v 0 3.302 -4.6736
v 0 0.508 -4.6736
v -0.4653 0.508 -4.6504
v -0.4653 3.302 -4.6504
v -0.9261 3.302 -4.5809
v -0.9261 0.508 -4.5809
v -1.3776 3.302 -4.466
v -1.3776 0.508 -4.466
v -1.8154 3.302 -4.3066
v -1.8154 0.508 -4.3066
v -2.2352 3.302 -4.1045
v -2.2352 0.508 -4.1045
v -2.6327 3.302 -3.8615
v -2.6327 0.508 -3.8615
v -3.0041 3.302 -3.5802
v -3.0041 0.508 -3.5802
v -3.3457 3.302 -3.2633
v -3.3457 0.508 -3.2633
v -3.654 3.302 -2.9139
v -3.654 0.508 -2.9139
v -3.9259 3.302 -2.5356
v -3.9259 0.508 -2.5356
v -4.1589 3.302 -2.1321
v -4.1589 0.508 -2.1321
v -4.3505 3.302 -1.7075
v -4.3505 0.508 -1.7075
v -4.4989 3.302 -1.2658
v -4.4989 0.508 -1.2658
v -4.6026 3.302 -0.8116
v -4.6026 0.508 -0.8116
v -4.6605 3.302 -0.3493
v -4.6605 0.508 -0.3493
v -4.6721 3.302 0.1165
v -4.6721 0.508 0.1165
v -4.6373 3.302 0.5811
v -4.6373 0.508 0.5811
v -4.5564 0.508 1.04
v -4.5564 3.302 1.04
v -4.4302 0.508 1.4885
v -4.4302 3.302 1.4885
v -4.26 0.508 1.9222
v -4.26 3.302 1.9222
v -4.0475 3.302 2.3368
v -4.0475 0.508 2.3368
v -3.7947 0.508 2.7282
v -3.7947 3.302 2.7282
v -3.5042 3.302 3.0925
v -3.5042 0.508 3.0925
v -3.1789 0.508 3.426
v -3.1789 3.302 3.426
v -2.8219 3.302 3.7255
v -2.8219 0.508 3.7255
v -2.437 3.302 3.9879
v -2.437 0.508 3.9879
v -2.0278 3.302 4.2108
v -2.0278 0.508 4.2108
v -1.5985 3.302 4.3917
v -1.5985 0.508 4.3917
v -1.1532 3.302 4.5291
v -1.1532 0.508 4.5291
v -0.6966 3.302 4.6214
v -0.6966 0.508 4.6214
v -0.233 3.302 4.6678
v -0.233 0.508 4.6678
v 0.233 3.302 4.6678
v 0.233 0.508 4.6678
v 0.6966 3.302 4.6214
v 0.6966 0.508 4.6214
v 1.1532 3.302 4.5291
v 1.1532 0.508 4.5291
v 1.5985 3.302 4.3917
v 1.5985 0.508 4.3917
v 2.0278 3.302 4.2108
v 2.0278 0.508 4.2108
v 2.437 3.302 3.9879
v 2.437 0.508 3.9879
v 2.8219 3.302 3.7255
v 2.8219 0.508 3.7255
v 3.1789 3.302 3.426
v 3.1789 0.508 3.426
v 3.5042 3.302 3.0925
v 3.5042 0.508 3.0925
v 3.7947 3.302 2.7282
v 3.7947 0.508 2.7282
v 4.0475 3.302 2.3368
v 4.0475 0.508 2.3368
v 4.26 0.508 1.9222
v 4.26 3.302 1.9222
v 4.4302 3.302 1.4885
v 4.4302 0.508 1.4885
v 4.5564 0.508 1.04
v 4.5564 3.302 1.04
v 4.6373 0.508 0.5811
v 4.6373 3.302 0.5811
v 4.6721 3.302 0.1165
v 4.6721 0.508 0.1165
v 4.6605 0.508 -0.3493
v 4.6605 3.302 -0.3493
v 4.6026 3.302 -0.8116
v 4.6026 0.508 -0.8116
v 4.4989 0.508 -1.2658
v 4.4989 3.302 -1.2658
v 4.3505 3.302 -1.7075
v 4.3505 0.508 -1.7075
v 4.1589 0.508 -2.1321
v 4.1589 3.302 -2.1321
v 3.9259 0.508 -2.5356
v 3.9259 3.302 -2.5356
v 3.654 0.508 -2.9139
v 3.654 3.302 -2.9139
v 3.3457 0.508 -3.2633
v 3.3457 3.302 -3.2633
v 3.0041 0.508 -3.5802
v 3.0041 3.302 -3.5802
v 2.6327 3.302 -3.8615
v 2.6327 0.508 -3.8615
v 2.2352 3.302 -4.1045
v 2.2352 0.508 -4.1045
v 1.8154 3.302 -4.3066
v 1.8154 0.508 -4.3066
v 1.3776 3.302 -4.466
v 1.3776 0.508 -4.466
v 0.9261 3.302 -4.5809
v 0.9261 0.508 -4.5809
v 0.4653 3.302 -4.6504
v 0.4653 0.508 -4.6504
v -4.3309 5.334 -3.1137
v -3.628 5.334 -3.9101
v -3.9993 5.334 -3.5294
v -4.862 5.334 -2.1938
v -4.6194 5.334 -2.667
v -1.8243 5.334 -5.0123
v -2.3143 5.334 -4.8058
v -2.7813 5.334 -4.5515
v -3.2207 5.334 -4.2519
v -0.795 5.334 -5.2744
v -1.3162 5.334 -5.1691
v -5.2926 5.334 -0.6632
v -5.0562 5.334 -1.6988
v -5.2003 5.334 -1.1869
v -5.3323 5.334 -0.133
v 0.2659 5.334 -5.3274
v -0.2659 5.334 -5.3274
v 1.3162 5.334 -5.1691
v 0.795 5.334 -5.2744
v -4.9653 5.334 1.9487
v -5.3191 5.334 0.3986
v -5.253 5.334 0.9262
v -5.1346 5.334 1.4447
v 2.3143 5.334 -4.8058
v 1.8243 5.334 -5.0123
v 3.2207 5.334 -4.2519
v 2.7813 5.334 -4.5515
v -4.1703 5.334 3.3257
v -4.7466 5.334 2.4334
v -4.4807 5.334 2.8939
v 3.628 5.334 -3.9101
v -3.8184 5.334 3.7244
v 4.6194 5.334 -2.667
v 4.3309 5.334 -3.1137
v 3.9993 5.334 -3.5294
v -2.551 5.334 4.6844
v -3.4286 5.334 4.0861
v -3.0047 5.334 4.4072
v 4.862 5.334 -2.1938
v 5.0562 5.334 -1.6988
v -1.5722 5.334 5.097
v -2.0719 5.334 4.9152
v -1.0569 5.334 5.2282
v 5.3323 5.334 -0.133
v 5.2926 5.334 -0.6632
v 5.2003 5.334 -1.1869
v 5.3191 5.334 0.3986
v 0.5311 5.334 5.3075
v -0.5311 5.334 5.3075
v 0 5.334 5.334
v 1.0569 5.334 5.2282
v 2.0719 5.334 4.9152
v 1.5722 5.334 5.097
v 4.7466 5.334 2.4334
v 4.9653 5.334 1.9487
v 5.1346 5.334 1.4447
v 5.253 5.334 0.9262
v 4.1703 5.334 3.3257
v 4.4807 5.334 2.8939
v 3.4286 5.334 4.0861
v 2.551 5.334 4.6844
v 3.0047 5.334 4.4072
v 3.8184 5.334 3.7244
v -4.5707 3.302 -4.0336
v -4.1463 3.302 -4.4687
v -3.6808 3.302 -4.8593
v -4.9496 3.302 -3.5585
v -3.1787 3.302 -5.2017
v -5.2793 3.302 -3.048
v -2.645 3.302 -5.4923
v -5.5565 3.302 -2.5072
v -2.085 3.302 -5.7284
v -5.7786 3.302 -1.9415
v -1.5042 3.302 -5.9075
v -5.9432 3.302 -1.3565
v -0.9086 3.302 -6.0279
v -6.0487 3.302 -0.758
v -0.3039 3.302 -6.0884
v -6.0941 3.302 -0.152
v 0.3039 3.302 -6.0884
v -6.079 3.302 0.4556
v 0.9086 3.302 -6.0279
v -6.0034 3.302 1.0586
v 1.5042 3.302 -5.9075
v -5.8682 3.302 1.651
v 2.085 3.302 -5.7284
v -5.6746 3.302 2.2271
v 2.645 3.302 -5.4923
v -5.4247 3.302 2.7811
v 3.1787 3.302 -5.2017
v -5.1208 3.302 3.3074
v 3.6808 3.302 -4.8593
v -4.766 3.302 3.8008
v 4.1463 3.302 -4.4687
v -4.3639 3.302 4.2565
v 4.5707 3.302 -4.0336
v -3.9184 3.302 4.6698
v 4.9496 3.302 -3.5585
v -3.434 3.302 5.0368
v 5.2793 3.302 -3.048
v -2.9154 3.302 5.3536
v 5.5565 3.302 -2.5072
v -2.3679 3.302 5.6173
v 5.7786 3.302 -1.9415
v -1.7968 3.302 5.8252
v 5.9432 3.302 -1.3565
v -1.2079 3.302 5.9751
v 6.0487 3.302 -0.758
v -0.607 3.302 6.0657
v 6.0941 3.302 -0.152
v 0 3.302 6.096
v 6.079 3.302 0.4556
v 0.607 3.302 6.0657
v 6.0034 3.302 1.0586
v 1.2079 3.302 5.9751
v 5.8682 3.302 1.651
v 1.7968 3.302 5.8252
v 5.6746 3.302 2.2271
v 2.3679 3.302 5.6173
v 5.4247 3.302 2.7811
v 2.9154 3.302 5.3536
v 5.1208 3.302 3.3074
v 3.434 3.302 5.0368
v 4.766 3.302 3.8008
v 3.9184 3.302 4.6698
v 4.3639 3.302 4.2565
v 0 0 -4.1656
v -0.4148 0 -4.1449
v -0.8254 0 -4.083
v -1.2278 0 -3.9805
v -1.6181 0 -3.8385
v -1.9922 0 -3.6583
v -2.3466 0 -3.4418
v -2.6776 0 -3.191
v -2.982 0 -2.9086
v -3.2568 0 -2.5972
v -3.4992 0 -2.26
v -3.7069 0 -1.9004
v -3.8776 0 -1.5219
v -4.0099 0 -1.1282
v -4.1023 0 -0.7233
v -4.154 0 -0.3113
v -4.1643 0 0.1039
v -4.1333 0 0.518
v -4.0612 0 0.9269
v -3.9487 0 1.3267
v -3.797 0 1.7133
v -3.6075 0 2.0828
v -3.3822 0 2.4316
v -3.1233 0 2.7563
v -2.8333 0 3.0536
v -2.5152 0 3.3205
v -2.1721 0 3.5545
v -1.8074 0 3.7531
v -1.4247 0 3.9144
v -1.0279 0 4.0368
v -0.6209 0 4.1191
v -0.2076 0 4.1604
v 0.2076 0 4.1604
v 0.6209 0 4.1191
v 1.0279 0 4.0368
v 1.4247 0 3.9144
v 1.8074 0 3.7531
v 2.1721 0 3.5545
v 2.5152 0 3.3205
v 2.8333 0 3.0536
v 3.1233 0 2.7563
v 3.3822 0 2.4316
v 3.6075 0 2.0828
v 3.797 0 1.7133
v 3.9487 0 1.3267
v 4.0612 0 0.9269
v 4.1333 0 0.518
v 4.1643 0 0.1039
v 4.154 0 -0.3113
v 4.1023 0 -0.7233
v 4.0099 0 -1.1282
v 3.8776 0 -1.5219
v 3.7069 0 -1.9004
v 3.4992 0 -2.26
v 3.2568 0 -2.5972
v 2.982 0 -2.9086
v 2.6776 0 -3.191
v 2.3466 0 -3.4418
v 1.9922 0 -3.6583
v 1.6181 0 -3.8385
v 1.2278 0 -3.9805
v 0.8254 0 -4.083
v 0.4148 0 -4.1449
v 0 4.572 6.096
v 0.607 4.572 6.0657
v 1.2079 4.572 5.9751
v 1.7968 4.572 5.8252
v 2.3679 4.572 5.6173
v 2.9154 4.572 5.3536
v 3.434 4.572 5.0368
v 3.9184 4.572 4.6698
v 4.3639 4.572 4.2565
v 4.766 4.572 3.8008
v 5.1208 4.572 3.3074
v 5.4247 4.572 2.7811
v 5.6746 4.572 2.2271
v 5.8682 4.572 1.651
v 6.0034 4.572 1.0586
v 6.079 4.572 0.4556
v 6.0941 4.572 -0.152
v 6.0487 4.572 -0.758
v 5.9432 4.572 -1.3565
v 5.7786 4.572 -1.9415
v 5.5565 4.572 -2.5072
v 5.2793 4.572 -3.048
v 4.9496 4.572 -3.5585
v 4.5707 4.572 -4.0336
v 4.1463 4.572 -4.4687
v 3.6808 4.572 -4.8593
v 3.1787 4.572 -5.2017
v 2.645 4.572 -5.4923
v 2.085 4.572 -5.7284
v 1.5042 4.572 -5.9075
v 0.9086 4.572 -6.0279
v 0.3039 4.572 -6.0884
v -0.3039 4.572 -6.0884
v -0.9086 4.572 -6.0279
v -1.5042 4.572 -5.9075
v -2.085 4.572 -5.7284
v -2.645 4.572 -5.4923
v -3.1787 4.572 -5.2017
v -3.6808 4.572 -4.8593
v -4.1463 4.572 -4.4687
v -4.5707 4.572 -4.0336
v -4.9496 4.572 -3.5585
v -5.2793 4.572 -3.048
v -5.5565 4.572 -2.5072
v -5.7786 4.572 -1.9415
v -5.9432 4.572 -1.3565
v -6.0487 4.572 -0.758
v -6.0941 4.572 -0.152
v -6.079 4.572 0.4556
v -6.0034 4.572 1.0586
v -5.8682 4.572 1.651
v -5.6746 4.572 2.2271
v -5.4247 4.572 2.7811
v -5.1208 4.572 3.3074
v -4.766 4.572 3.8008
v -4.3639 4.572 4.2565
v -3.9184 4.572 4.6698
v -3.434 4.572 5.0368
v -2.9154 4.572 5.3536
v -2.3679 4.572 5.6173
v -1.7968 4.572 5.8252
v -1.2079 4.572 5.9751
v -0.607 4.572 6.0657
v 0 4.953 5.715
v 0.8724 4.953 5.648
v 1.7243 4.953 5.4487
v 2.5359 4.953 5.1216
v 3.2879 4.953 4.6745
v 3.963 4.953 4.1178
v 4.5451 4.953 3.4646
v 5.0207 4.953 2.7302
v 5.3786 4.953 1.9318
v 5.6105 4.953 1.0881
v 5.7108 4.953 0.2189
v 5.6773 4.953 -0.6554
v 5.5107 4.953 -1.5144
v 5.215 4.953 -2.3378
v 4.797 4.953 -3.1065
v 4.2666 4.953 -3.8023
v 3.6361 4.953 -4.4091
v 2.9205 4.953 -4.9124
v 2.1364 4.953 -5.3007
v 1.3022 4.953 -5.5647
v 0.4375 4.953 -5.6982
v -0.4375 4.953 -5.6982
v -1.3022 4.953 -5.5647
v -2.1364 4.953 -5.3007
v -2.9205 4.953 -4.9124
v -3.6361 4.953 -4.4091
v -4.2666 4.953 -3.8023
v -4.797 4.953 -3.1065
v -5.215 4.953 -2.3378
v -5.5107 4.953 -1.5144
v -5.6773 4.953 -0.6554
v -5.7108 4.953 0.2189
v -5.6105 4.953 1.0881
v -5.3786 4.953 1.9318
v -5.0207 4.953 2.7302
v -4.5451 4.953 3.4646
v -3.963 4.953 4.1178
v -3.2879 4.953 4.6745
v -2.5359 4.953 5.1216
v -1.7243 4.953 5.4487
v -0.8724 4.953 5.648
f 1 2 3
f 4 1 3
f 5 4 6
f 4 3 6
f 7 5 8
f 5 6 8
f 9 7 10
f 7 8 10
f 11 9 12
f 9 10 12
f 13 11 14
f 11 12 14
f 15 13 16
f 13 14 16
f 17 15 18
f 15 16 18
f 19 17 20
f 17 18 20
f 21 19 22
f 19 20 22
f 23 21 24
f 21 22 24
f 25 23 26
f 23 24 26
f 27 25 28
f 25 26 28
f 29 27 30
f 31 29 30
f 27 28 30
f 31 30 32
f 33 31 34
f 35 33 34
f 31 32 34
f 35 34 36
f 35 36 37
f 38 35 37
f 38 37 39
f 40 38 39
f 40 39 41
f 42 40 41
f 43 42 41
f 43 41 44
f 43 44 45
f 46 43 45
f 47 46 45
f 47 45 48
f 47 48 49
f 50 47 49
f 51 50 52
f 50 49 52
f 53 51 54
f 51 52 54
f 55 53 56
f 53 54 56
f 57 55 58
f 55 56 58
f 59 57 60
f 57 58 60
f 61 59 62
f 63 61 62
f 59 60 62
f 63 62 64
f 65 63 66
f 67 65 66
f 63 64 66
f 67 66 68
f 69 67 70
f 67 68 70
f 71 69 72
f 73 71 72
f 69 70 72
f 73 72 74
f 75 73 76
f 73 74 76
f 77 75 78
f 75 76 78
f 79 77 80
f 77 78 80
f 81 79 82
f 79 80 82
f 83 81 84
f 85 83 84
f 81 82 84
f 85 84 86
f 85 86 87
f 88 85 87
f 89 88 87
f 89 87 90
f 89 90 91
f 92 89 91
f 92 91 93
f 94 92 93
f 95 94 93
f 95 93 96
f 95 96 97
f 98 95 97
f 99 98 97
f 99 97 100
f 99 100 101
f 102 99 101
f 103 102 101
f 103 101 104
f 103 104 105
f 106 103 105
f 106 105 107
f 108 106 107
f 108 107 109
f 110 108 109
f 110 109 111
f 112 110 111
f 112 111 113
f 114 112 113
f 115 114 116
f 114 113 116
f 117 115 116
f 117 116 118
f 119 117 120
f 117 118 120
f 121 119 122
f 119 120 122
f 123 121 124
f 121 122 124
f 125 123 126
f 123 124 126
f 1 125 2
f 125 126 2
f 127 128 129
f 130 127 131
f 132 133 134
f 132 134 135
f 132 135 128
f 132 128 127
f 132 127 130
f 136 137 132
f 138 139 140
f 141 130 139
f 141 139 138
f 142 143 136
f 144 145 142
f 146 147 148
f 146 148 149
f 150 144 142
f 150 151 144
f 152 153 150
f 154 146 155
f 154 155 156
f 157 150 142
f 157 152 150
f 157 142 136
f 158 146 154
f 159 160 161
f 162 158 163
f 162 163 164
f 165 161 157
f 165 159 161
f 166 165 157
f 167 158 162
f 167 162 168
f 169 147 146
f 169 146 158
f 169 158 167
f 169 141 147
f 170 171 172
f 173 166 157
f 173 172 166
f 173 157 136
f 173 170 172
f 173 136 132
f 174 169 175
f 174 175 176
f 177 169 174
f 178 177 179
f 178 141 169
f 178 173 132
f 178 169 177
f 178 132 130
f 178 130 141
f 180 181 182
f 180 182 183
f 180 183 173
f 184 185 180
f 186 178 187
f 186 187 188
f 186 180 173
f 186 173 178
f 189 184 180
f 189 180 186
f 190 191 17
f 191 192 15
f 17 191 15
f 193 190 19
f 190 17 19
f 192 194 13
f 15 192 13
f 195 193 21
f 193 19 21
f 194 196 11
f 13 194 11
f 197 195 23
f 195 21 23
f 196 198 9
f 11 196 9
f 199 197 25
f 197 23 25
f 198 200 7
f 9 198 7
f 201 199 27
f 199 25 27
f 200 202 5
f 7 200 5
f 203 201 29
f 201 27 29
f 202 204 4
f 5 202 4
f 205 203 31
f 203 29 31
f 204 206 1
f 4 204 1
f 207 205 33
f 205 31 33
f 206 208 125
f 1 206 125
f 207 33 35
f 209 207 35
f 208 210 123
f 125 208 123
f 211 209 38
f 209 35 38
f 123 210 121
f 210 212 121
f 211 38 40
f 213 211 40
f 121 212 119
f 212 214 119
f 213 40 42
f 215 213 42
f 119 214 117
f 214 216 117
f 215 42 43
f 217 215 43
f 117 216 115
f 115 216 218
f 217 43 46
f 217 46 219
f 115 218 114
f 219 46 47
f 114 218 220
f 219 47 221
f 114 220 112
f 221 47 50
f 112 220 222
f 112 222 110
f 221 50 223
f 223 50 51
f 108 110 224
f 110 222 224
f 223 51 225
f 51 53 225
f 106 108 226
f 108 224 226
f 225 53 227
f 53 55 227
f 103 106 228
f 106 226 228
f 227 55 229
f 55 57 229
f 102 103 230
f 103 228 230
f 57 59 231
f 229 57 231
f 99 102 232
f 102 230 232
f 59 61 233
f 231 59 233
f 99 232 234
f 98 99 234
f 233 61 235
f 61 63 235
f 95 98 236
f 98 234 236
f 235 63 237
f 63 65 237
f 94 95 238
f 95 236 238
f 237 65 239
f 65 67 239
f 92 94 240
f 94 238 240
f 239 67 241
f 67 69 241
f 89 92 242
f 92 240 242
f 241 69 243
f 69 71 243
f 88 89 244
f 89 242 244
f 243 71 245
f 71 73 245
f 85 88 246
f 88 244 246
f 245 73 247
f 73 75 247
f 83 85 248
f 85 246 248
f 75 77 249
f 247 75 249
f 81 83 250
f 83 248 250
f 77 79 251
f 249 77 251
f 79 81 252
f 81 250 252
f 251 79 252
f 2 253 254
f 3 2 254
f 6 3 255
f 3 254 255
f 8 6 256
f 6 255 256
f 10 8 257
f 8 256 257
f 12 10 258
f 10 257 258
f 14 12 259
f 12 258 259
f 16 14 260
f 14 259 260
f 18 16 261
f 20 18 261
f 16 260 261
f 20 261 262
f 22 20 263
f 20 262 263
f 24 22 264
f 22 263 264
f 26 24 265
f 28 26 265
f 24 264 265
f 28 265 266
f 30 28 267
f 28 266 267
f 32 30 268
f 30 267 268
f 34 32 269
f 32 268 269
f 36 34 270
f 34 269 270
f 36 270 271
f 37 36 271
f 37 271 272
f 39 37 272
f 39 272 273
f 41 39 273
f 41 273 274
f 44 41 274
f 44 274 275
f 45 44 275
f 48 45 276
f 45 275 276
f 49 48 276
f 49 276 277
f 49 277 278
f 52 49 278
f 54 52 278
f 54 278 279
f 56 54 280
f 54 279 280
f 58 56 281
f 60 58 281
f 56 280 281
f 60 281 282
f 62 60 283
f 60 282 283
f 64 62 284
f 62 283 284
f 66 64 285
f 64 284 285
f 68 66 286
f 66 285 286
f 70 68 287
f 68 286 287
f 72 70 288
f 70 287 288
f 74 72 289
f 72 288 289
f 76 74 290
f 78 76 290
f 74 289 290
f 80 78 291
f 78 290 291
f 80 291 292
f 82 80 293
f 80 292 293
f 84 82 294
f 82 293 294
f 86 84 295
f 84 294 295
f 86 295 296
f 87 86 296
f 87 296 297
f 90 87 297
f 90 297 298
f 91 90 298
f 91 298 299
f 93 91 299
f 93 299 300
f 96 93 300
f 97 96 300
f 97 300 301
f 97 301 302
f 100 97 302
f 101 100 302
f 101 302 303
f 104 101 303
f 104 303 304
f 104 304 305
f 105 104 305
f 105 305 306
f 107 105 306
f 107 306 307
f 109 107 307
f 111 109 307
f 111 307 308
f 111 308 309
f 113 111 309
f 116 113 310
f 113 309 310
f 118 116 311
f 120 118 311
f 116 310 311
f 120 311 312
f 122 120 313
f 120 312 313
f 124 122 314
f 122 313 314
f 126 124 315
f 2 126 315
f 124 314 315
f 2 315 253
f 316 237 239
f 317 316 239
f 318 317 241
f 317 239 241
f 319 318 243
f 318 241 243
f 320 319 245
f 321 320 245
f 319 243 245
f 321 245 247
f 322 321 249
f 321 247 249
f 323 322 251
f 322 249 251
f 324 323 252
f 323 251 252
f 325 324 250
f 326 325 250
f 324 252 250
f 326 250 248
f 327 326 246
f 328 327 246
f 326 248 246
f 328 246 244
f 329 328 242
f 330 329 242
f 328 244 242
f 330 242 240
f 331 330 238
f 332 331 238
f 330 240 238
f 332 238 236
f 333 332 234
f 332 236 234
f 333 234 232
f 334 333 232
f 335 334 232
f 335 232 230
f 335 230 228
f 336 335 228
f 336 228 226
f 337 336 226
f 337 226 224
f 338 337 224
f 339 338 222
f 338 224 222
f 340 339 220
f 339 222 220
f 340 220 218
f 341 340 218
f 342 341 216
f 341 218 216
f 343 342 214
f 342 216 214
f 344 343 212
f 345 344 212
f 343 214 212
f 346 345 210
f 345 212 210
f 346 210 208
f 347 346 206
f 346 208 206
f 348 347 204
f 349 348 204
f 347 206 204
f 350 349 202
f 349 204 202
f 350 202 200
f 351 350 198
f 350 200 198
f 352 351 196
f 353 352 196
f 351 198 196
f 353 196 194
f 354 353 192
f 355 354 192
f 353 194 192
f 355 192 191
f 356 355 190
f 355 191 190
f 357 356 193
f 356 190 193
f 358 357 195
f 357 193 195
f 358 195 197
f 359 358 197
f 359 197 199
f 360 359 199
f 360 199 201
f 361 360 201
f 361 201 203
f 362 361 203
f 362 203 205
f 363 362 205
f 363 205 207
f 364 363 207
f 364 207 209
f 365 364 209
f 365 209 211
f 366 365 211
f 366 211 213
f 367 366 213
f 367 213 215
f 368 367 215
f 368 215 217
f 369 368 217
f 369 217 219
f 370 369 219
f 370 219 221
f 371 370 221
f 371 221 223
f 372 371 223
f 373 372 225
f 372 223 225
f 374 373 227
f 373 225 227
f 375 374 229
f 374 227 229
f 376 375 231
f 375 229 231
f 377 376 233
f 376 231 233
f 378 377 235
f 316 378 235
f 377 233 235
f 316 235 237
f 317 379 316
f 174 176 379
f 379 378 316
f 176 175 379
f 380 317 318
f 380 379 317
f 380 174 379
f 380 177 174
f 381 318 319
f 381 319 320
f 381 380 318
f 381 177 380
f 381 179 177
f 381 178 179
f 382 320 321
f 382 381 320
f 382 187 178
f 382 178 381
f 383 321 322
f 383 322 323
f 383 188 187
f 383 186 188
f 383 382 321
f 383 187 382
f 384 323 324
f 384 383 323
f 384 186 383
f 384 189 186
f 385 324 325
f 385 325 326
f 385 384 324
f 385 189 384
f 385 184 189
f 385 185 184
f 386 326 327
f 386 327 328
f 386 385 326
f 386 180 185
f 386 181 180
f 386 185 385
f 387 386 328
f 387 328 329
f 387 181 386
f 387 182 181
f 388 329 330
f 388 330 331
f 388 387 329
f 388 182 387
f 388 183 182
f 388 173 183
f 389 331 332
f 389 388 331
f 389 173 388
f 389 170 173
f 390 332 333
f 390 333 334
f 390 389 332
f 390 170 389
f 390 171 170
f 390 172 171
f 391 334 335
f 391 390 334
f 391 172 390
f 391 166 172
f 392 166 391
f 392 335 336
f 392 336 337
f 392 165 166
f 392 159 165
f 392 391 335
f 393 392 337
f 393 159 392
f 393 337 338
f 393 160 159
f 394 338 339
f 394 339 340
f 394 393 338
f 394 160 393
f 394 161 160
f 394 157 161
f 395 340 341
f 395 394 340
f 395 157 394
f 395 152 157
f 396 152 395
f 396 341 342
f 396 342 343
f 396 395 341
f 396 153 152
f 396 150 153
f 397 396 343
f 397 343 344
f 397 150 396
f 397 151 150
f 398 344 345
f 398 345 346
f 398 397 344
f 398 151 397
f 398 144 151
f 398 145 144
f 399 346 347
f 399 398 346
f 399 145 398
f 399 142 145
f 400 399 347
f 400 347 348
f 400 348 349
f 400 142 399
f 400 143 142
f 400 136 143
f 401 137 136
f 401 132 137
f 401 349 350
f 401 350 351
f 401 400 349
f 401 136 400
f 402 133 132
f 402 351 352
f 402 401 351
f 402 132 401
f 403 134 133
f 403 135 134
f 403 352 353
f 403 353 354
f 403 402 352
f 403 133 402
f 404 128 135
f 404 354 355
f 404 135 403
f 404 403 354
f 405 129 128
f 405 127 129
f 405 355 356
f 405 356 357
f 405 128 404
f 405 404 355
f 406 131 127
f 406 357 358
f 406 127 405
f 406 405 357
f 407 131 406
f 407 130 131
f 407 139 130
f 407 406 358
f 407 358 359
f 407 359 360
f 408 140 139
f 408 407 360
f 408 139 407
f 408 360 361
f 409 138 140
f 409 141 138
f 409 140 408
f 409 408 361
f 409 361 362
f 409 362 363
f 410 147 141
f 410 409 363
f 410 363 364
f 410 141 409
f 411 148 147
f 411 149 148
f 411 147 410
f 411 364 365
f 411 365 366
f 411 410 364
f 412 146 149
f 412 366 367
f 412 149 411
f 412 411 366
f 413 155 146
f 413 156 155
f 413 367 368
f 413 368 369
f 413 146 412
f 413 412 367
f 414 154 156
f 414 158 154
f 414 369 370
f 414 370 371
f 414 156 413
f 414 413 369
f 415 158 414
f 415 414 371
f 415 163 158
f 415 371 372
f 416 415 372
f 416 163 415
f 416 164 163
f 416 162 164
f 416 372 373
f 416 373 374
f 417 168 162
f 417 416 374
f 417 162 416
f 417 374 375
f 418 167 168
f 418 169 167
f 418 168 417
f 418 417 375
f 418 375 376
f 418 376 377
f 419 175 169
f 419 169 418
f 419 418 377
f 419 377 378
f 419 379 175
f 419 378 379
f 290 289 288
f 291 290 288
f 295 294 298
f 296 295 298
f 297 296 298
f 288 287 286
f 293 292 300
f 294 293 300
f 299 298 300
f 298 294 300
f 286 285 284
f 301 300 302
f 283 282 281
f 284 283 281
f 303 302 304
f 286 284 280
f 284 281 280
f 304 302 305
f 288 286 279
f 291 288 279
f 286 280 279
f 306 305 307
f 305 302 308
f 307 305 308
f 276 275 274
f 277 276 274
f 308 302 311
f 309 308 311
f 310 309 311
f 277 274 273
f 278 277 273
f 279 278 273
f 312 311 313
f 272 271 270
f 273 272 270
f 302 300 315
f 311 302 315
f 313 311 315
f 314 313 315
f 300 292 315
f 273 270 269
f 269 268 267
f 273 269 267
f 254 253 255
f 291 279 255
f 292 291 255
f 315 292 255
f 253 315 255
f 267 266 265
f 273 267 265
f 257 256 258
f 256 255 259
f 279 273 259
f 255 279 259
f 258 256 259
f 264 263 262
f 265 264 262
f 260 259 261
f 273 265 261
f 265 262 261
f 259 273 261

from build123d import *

# Parameters (mm, degrees)
SKETCH1_R           = 4.6736
BOSS_EXTRUDE1_DEPTH = 3.302
SKETCH2_R           = 6.096
BOSS_EXTRUDE2_DEPTH = 2.032
CHAMFER1_SIZE       = 0.762
CHAMFER2_SIZE       = 0.508


with BuildPart() as part:
    # Sketch1 → Boss-Extrude1 (new body)
    with BuildSketch(Plane(origin=(0, 0, 0), x_dir=(1, 0, 0), z_dir=(0, 1, 0))):
        with Locations(Location((0, 0, 0), (0, 0, 90))):
            Circle(SKETCH1_R)
    extrude(amount=BOSS_EXTRUDE1_DEPTH)

    # Sketch2 → Boss-Extrude2 (add)
    with BuildSketch(Plane(origin=(0, 3.302, 0), x_dir=(1, 0, 0), z_dir=(0, 1, 0))):
        with Locations(Location((0, 0, 0), (0, 0, 270))):
            Circle(SKETCH2_R)
    extrude(amount=BOSS_EXTRUDE2_DEPTH)

    # Chamfer1
    chamfer1_edges = [part.edges().sort_by_distance(p)[0] for p in [
        (0, 5.334, -6.096),
    ]]
    chamfer(chamfer1_edges, length=CHAMFER1_SIZE)

    # Chamfer2
    chamfer2_edges = [part.edges().sort_by_distance(p)[0] for p in [
        (0, 0, 4.6736),
    ]]
    chamfer(chamfer2_edges, length=CHAMFER2_SIZE)


solid = part.part
